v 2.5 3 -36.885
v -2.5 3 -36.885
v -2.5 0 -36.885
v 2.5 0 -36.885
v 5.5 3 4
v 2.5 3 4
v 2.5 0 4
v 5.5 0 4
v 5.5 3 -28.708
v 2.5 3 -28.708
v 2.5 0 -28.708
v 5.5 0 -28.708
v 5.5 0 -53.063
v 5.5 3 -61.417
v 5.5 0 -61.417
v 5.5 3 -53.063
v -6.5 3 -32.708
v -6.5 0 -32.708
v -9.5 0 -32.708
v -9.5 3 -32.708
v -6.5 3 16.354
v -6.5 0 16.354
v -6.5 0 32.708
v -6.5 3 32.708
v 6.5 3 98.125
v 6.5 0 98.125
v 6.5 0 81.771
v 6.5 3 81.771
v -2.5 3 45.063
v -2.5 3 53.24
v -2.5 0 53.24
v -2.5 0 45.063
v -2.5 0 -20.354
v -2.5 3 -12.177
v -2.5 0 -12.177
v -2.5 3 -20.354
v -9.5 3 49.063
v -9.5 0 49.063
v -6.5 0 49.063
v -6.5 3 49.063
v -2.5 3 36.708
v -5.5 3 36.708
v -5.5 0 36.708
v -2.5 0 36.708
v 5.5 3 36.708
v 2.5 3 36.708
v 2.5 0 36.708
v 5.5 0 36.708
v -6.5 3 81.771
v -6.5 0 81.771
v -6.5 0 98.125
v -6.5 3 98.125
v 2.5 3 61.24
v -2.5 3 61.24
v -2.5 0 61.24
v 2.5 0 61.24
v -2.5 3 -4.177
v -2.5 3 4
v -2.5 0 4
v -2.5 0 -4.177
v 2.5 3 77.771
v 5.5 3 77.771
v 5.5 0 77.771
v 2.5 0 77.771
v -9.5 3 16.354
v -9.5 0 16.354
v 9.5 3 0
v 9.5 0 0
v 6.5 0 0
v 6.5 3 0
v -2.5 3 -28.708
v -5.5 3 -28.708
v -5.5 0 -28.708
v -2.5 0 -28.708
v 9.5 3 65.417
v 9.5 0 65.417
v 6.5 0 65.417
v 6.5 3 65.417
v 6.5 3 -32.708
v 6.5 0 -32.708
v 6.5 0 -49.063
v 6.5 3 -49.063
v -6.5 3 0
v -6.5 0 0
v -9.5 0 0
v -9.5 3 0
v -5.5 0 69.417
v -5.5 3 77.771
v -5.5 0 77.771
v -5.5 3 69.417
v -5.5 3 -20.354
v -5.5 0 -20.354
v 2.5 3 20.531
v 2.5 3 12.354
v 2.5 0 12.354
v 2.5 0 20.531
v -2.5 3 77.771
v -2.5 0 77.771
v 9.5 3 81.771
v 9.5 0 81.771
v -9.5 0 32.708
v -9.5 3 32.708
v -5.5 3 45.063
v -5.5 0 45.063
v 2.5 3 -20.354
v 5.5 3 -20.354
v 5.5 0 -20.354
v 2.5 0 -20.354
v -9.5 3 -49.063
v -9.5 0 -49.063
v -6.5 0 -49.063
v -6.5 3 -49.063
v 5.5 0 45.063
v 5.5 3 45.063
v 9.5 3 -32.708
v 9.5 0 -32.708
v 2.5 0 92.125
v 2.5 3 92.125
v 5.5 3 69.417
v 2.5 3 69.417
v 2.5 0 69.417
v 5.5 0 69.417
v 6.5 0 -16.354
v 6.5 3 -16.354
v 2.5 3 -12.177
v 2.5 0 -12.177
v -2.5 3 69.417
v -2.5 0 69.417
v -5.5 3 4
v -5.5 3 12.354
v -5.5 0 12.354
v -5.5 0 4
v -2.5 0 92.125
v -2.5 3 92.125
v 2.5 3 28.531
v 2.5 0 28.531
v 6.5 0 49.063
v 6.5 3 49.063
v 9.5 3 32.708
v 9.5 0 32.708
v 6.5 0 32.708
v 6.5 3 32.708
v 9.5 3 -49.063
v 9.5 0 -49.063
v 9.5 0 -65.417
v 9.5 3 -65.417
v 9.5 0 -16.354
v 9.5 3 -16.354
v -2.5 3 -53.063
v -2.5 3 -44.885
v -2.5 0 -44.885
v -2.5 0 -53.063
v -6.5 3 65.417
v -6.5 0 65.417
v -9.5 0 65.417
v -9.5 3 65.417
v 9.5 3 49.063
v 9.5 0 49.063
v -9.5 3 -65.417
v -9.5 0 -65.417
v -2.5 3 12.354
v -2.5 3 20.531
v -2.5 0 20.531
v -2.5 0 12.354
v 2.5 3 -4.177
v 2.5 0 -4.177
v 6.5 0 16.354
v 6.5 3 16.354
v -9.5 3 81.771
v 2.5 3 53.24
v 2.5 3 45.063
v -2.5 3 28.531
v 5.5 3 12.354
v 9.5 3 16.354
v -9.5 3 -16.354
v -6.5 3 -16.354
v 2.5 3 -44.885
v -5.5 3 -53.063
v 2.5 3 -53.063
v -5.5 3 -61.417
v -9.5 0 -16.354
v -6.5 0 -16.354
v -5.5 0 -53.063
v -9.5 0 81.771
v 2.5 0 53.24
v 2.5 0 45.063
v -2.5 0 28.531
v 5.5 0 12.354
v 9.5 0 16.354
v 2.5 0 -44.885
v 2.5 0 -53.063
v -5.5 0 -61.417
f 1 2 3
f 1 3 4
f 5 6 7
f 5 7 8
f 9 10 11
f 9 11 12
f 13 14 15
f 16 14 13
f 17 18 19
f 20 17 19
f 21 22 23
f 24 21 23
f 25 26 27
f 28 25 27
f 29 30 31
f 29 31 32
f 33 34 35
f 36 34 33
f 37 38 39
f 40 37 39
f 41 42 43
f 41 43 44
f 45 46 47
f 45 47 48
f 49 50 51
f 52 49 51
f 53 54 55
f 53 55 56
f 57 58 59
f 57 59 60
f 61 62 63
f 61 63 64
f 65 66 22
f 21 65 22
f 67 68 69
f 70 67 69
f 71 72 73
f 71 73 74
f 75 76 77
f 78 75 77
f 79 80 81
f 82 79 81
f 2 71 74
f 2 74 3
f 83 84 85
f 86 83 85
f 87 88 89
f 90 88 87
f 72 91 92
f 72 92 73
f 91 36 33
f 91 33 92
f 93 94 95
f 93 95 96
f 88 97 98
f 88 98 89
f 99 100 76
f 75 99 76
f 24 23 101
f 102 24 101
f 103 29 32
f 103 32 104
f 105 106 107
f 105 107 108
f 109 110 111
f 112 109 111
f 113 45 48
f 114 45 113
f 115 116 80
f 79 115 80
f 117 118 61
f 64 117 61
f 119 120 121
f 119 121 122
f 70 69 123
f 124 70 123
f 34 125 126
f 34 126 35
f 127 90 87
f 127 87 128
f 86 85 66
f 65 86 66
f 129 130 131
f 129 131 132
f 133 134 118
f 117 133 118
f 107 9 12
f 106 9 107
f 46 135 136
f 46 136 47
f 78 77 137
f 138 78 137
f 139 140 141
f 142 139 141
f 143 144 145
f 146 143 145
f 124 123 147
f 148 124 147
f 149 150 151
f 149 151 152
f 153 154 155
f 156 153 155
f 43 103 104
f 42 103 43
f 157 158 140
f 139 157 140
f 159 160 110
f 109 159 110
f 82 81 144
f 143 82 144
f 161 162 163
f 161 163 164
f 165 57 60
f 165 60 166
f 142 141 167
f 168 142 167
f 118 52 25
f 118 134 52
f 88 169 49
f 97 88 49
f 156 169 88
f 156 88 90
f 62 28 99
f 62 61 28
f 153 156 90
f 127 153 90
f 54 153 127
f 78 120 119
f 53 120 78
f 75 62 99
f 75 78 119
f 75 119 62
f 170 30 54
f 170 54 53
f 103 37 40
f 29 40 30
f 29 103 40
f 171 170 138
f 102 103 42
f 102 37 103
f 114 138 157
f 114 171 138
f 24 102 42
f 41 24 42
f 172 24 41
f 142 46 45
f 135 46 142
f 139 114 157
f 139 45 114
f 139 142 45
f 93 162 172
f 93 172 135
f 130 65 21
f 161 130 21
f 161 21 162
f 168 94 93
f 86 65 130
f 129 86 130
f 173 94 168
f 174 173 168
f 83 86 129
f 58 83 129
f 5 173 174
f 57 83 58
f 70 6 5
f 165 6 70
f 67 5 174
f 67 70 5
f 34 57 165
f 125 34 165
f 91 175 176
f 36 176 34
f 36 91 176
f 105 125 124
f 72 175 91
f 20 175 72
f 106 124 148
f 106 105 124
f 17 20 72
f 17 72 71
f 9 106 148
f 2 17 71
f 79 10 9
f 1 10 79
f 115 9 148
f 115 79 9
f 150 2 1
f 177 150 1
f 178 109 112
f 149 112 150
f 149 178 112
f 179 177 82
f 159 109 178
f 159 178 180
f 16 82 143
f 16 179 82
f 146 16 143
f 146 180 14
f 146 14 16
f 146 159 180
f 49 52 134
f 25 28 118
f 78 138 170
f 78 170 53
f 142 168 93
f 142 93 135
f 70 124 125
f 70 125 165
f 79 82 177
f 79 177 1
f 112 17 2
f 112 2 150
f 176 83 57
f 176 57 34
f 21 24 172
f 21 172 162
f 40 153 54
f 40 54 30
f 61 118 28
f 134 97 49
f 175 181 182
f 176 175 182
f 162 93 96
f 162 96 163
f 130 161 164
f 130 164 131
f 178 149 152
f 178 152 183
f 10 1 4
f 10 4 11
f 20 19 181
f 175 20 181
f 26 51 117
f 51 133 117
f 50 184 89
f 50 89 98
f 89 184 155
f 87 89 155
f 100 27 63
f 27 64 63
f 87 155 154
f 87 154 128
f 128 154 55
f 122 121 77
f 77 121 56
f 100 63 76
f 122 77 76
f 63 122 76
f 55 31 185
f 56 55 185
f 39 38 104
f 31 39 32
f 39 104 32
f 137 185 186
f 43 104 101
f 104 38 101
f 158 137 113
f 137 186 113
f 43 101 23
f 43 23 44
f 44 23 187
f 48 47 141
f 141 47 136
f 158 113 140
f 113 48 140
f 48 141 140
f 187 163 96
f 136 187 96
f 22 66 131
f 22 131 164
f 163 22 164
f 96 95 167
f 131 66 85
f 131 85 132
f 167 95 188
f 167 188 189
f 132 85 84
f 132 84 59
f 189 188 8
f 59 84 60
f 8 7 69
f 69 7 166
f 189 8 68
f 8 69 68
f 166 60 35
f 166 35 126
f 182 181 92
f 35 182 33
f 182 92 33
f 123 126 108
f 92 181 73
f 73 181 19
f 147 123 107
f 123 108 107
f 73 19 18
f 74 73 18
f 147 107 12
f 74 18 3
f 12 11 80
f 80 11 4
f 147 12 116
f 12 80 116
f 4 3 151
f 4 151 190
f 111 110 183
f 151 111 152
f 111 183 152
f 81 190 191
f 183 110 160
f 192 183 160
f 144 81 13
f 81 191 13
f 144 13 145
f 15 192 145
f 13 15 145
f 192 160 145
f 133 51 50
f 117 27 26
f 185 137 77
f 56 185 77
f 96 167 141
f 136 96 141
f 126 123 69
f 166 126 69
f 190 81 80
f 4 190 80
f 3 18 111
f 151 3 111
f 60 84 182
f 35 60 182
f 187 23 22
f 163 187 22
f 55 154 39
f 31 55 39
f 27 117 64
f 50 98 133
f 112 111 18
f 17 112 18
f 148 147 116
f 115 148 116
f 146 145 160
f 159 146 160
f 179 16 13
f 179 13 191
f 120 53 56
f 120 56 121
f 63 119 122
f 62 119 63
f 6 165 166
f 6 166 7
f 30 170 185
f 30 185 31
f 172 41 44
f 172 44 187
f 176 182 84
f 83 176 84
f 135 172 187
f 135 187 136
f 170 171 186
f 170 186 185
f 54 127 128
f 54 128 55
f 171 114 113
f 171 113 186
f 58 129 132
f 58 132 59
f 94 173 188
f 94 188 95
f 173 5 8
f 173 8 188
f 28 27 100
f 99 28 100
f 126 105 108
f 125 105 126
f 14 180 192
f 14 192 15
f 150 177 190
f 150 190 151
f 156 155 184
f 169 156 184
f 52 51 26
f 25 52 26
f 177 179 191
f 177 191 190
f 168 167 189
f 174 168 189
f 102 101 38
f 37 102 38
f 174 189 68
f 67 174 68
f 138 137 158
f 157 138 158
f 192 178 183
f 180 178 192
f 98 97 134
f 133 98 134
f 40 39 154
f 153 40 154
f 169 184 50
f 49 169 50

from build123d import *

# Parameters (mm, degrees)
BOSS_EXTRUDE1_DEPTH     = 3
SKETCH3_W               = 5
SKETCH3_H               = 6.177085
CUT_EXTRUDE1_DEPTH      = 1
CUT_EXTRUDE1_DEPTH_BACK = 4


with BuildPart() as part:
    # Sketch2 → Boss-Extrude1 (new body)
    with BuildSketch(Plane(origin=(0, 0, 0), x_dir=(1, 0, 0), z_dir=(0, 1, 0))):
        Polygon((-6.5, -81.77085), (-6.5, -98.12502), (6.5, -98.12502), (6.5, -81.77085), (9.5, -81.77085), (9.5, -65.41668), (6.5, -65.41668), (6.5, -49.06251), (9.5, -49.06251), (9.5, -32.70834), (6.5, -32.70834), (6.5, -16.35417), (9.5, -16.35417), (9.5, 0), (6.5, 0), (6.5, 16.35417), (9.5, 16.35417), (9.5, 32.70834), (6.5, 32.70834), (6.5, 49.06251), (9.5, 49.06251), (9.5, 65.41668), (6.5, 65.41668), (-6.5, 65.41668), (-9.5, 65.41668), (-9.5, 49.06251), (-6.5, 49.06251), (-6.5, 32.70834), (-9.5, 32.70834), (-9.5, 16.35417), (-6.5, 16.35417), (-6.5, 0), (-9.5, 0), (-9.5, -16.35417), (-6.5, -16.35417), (-6.5, -32.70834), (-9.5, -32.70834), (-9.5, -49.06251), (-6.5, -49.06251), (-6.5, -65.41668), (-9.5, -65.41668), (-9.5, -81.77085), align=None)
    extrude(amount=BOSS_EXTRUDE1_DEPTH)

    # Sketch3 → Cut-Extrude1 (cut, two sides)
    with BuildSketch(Plane(origin=(0, 3, 0), x_dir=(1, 0, 0), z_dir=(0, 1, 0))) as cut_extrude1_sk:
        Polygon((-5.5, 53.06251), (-5.5, 61.41668), (5.5, 61.41668), (5.5, 53.06251), (2.5, 53.06251), (2.5, 44.885425), (-2.5, 44.885425), (-2.5, 53.06251), align=None)
        Polygon((-2.5, 28.70834), (-2.5, 36.885425), (2.5, 36.885425), (2.5, 28.70834), (5.5, 28.70834), (5.5, 20.35417), (2.5, 20.35417), (2.5, 12.177085), (-2.5, 12.177085), (-2.5, 20.35417), (-5.5, 20.35417), (-5.5, 28.70834), align=None)
        Polygon((-5.5, -4), (-2.5, -4), (-2.5, 4.177085), (2.5, 4.177085), (2.5, -4), (5.5, -4), (5.5, -12.35417), (2.5, -12.35417), (2.5, -20.531255), (-2.5, -20.531255), (-2.5, -12.35417), (-5.5, -12.35417), align=None)
        Polygon((-5.5, -69.41668), (-2.5, -69.41668), (-2.5, -61.239595), (2.5, -61.239595), (2.5, -69.41668), (5.5, -69.41668), (5.5, -77.77085), (2.5, -77.77085), (2.5, -85.947935), (-2.5, -85.947935), (-2.5, -77.77085), (-5.5, -77.77085), align=None)
        with Locations((0, -89.0364775)):
            Rectangle(SKETCH3_W, SKETCH3_H)
        Polygon((-5.5, -36.70834), (-2.5, -36.70834), (-2.5, -28.531255), (2.5, -28.531255), (2.5, -36.70834), (5.5, -36.70834), (5.5, -45.06251), (2.5, -45.06251), (2.5, -53.239595), (-2.5, -53.239595), (-2.5, -45.06251), (-5.5, -45.06251), align=None)
    extrude(amount=CUT_EXTRUDE1_DEPTH, mode=Mode.SUBTRACT)
    extrude(cut_extrude1_sk.sketch, amount=-CUT_EXTRUDE1_DEPTH_BACK, mode=Mode.SUBTRACT)


solid = part.part
